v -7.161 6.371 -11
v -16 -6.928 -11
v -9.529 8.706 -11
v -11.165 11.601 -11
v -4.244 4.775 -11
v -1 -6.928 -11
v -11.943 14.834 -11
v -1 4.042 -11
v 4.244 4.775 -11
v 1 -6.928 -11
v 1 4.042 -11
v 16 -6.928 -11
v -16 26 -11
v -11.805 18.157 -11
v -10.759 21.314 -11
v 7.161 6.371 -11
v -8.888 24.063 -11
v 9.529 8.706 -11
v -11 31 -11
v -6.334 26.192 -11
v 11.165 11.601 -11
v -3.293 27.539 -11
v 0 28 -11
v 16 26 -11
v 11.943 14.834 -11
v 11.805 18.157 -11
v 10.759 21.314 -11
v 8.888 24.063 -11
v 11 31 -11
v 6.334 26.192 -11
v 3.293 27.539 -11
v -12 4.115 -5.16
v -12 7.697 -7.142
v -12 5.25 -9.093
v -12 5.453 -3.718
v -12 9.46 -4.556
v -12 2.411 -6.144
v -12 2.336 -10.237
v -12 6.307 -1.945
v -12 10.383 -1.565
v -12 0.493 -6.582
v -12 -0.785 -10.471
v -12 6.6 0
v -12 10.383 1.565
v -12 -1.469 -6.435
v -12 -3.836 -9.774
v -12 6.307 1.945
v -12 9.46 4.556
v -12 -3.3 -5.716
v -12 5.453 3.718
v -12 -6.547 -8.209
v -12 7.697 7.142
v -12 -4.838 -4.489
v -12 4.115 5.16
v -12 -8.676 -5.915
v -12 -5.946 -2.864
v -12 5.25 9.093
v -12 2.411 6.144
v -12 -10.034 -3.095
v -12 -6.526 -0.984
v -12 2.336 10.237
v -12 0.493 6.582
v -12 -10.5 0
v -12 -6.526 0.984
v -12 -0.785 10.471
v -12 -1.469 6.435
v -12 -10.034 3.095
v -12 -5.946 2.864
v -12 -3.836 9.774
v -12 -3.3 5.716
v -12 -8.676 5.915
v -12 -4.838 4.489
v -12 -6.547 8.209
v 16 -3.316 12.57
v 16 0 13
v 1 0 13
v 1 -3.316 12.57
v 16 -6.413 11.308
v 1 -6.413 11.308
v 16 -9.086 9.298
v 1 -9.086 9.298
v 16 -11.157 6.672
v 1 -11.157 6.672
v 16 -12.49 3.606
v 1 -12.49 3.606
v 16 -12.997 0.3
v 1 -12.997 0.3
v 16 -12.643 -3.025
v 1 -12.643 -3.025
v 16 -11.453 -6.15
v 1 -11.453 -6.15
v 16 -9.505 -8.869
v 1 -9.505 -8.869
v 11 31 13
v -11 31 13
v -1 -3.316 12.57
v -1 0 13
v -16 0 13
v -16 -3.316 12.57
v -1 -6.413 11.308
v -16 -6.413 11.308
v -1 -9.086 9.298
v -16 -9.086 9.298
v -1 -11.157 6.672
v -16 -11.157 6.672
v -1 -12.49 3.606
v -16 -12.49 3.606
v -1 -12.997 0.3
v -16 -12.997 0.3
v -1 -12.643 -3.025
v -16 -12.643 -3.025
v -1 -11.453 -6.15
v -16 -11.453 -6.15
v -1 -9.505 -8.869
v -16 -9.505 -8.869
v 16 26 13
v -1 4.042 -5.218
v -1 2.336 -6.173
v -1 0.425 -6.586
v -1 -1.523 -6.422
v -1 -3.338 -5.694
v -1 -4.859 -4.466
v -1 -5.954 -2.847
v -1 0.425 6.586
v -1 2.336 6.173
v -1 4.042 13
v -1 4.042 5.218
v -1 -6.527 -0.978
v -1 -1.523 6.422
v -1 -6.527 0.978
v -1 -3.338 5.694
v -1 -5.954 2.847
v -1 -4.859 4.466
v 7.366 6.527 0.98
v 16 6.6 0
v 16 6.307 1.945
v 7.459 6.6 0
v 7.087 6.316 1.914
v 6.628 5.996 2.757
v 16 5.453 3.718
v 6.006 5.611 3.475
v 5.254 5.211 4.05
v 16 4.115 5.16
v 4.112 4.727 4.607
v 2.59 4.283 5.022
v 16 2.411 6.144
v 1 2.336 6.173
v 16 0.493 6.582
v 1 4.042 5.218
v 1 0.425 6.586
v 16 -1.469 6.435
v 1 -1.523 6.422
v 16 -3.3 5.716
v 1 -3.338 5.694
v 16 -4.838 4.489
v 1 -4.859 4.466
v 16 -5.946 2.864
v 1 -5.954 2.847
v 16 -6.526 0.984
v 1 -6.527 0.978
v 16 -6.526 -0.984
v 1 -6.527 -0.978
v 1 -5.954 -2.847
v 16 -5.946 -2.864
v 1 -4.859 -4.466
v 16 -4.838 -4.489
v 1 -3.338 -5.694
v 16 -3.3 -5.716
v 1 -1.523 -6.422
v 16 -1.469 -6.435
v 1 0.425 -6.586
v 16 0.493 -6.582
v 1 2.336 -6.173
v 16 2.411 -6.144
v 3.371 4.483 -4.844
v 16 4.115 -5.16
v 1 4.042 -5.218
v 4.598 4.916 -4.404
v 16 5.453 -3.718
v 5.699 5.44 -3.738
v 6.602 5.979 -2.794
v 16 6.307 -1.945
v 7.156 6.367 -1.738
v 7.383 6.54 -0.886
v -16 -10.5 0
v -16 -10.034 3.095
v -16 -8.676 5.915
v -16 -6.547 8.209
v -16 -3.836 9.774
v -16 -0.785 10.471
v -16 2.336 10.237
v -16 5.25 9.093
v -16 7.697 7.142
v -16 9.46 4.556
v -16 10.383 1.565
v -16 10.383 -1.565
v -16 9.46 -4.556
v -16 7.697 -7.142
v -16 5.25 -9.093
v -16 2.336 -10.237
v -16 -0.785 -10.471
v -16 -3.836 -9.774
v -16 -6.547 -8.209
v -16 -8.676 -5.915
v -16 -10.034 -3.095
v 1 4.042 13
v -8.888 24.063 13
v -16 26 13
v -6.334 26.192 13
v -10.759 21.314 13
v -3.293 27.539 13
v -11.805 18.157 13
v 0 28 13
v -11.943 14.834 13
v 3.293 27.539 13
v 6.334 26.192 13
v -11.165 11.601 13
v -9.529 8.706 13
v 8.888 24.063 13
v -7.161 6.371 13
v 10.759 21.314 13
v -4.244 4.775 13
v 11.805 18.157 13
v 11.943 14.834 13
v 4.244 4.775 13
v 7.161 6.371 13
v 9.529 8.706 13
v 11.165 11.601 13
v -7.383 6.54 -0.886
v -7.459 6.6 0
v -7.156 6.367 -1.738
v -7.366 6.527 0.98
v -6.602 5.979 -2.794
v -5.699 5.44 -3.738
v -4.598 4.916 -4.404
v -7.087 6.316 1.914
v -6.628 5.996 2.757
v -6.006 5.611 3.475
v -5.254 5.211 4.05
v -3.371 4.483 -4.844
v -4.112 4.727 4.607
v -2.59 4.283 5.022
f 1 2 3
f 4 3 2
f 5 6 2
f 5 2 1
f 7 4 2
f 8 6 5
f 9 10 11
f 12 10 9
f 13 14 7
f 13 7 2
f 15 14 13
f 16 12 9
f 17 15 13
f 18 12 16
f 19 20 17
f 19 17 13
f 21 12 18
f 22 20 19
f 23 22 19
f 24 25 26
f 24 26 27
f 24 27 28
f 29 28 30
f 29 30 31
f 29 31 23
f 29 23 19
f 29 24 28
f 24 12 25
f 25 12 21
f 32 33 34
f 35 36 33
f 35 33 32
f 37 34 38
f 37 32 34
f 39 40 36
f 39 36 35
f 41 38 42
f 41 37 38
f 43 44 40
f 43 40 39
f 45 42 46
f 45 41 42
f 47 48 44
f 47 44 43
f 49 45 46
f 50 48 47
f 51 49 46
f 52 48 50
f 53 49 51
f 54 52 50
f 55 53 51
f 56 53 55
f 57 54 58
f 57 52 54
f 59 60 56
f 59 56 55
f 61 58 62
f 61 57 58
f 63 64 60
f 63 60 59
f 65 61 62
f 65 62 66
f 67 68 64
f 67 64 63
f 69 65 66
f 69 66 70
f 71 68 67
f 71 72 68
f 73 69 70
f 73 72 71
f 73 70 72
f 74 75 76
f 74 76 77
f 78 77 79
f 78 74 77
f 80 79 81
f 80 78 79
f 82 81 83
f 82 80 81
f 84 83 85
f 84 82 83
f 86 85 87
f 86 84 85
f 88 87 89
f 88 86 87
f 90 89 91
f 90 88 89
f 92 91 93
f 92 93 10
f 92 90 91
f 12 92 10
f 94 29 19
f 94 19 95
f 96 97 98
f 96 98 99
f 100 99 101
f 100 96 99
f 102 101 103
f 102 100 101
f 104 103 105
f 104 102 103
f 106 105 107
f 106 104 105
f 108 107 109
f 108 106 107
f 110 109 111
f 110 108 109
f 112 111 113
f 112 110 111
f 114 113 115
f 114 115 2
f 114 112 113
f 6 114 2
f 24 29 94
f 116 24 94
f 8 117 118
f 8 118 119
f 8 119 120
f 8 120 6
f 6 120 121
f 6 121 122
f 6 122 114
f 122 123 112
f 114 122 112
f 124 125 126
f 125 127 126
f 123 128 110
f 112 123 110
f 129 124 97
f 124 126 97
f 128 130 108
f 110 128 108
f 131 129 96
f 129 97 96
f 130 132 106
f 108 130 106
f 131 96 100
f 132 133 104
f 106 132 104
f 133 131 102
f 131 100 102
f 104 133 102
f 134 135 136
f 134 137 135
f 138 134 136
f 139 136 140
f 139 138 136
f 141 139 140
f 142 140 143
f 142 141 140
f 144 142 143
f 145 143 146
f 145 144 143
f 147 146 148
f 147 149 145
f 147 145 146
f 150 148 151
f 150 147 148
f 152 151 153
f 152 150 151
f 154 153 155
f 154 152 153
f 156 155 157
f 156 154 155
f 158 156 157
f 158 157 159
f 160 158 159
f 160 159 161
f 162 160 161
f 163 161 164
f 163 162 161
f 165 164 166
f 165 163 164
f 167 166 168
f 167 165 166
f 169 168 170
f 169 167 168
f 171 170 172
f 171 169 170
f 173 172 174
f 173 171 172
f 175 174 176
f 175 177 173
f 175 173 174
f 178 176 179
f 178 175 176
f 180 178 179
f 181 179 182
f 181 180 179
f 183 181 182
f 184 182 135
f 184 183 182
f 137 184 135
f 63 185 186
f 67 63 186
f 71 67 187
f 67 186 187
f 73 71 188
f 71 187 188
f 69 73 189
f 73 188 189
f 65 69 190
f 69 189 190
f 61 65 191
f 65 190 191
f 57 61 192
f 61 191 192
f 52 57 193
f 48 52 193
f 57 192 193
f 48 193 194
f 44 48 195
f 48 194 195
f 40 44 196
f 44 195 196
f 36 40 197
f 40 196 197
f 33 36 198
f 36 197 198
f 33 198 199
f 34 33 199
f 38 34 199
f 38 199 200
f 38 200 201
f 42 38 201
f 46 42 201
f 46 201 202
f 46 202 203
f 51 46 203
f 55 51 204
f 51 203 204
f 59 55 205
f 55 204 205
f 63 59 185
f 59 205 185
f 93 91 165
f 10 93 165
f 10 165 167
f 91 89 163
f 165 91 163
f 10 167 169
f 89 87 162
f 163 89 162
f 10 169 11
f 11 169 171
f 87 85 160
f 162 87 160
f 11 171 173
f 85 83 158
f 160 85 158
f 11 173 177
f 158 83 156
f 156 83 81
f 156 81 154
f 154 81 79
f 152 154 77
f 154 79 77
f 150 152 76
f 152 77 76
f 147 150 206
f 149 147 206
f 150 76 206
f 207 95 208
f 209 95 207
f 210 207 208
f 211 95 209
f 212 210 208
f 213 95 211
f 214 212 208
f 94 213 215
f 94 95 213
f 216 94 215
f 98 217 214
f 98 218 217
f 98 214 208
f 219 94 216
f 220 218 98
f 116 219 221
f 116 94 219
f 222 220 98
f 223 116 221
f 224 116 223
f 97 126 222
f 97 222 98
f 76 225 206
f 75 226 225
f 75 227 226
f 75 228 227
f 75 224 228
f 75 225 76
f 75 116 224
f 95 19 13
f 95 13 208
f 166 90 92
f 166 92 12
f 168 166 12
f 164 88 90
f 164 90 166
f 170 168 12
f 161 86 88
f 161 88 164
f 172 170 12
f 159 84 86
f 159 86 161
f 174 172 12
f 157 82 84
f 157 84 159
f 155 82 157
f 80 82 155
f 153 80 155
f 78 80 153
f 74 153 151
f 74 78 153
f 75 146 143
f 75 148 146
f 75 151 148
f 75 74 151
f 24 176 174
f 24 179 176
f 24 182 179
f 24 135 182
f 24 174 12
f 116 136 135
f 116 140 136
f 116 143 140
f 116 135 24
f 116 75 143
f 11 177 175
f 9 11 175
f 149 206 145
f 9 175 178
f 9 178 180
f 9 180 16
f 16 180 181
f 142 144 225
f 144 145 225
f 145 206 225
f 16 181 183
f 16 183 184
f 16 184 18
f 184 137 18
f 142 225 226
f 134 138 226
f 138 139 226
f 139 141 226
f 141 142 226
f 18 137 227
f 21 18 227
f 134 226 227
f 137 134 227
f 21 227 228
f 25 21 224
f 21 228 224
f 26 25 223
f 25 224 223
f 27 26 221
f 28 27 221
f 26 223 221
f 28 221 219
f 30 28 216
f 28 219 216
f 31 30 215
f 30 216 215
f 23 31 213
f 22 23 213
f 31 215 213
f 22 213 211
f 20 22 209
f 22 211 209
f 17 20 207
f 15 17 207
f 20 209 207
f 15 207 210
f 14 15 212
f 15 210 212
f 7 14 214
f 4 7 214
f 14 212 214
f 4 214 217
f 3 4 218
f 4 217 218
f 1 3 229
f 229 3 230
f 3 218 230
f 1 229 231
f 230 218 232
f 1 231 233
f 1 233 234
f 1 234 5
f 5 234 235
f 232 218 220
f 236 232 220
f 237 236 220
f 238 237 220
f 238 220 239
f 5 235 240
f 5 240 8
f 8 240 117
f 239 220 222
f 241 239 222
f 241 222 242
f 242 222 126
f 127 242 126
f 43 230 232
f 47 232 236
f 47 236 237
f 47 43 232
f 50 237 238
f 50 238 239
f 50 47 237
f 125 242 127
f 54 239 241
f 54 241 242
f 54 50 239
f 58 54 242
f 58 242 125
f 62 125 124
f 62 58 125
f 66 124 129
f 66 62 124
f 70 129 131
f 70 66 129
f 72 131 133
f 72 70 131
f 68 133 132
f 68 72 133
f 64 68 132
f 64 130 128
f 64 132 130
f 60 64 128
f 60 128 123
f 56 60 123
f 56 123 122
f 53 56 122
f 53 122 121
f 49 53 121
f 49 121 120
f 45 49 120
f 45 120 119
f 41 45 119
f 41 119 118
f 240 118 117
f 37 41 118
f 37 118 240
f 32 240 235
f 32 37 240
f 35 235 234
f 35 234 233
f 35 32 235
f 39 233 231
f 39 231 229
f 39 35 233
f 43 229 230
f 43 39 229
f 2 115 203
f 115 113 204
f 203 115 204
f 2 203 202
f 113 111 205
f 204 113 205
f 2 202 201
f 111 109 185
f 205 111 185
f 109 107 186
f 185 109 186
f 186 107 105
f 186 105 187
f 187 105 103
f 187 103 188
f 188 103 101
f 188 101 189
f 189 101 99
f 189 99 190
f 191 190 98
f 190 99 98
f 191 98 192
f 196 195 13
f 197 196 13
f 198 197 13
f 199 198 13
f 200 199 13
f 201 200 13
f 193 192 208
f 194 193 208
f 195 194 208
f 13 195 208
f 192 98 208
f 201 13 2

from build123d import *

# Parameters (mm, degrees)
F0_R     = 6.6
F2_DEPTH = 16
F3_R     = 10.5
F3_R_2   = 6.6
F4_DEPTH = 4
F5_DEPTH = 15
F6_SIZE  = 5


with BuildPart() as f2:
    # F0 (on Right) → F2 (new body, symmetric)
    with BuildSketch(Plane.YZ):
        with BuildLine():
            Line((31, 13), (0, 13))
            ThreePointArc((0, 13), (-12.489996, 3.605551), (-6.928203, -11))
            Line((-6.928203, -11), (31, -11))
            Line((31, -11), (31, 13))
        make_face()
        Circle(F0_R, mode=Mode.SUBTRACT)
    extrude(amount=F2_DEPTH, both=True)

    # F3 (on face) → F4 (cut)
    with BuildSketch(Plane(origin=(-16, 0, 0), x_dir=(0, -1, 0), z_dir=(-1, 0, 0))):
        Circle(F3_R)
        Circle(F3_R_2, mode=Mode.SUBTRACT)
    extrude(amount=-F4_DEPTH, mode=Mode.SUBTRACT)

    # F1 (on Top) → F5 (cut, symmetric)
    with BuildSketch(Plane.XY):
        with BuildLine():
            Line((-1, -13), (1, -13))
            Line((1, -13), (1, 4.041739))
            ThreePointArc((1, 4.041739), (0, 28), (-1, 4.041739))
            Line((-1, 4.041739), (-1, -13))
        make_face()
    extrude(amount=F5_DEPTH, both=True, mode=Mode.SUBTRACT)

    # F6
    f6_edges = [f2.edges().sort_by_distance(p)[0] for p in [
        (16, 31, 1),
        (-16, 31, 1),
    ]]
    chamfer(f6_edges, length=F6_SIZE)


solid = f2.part
